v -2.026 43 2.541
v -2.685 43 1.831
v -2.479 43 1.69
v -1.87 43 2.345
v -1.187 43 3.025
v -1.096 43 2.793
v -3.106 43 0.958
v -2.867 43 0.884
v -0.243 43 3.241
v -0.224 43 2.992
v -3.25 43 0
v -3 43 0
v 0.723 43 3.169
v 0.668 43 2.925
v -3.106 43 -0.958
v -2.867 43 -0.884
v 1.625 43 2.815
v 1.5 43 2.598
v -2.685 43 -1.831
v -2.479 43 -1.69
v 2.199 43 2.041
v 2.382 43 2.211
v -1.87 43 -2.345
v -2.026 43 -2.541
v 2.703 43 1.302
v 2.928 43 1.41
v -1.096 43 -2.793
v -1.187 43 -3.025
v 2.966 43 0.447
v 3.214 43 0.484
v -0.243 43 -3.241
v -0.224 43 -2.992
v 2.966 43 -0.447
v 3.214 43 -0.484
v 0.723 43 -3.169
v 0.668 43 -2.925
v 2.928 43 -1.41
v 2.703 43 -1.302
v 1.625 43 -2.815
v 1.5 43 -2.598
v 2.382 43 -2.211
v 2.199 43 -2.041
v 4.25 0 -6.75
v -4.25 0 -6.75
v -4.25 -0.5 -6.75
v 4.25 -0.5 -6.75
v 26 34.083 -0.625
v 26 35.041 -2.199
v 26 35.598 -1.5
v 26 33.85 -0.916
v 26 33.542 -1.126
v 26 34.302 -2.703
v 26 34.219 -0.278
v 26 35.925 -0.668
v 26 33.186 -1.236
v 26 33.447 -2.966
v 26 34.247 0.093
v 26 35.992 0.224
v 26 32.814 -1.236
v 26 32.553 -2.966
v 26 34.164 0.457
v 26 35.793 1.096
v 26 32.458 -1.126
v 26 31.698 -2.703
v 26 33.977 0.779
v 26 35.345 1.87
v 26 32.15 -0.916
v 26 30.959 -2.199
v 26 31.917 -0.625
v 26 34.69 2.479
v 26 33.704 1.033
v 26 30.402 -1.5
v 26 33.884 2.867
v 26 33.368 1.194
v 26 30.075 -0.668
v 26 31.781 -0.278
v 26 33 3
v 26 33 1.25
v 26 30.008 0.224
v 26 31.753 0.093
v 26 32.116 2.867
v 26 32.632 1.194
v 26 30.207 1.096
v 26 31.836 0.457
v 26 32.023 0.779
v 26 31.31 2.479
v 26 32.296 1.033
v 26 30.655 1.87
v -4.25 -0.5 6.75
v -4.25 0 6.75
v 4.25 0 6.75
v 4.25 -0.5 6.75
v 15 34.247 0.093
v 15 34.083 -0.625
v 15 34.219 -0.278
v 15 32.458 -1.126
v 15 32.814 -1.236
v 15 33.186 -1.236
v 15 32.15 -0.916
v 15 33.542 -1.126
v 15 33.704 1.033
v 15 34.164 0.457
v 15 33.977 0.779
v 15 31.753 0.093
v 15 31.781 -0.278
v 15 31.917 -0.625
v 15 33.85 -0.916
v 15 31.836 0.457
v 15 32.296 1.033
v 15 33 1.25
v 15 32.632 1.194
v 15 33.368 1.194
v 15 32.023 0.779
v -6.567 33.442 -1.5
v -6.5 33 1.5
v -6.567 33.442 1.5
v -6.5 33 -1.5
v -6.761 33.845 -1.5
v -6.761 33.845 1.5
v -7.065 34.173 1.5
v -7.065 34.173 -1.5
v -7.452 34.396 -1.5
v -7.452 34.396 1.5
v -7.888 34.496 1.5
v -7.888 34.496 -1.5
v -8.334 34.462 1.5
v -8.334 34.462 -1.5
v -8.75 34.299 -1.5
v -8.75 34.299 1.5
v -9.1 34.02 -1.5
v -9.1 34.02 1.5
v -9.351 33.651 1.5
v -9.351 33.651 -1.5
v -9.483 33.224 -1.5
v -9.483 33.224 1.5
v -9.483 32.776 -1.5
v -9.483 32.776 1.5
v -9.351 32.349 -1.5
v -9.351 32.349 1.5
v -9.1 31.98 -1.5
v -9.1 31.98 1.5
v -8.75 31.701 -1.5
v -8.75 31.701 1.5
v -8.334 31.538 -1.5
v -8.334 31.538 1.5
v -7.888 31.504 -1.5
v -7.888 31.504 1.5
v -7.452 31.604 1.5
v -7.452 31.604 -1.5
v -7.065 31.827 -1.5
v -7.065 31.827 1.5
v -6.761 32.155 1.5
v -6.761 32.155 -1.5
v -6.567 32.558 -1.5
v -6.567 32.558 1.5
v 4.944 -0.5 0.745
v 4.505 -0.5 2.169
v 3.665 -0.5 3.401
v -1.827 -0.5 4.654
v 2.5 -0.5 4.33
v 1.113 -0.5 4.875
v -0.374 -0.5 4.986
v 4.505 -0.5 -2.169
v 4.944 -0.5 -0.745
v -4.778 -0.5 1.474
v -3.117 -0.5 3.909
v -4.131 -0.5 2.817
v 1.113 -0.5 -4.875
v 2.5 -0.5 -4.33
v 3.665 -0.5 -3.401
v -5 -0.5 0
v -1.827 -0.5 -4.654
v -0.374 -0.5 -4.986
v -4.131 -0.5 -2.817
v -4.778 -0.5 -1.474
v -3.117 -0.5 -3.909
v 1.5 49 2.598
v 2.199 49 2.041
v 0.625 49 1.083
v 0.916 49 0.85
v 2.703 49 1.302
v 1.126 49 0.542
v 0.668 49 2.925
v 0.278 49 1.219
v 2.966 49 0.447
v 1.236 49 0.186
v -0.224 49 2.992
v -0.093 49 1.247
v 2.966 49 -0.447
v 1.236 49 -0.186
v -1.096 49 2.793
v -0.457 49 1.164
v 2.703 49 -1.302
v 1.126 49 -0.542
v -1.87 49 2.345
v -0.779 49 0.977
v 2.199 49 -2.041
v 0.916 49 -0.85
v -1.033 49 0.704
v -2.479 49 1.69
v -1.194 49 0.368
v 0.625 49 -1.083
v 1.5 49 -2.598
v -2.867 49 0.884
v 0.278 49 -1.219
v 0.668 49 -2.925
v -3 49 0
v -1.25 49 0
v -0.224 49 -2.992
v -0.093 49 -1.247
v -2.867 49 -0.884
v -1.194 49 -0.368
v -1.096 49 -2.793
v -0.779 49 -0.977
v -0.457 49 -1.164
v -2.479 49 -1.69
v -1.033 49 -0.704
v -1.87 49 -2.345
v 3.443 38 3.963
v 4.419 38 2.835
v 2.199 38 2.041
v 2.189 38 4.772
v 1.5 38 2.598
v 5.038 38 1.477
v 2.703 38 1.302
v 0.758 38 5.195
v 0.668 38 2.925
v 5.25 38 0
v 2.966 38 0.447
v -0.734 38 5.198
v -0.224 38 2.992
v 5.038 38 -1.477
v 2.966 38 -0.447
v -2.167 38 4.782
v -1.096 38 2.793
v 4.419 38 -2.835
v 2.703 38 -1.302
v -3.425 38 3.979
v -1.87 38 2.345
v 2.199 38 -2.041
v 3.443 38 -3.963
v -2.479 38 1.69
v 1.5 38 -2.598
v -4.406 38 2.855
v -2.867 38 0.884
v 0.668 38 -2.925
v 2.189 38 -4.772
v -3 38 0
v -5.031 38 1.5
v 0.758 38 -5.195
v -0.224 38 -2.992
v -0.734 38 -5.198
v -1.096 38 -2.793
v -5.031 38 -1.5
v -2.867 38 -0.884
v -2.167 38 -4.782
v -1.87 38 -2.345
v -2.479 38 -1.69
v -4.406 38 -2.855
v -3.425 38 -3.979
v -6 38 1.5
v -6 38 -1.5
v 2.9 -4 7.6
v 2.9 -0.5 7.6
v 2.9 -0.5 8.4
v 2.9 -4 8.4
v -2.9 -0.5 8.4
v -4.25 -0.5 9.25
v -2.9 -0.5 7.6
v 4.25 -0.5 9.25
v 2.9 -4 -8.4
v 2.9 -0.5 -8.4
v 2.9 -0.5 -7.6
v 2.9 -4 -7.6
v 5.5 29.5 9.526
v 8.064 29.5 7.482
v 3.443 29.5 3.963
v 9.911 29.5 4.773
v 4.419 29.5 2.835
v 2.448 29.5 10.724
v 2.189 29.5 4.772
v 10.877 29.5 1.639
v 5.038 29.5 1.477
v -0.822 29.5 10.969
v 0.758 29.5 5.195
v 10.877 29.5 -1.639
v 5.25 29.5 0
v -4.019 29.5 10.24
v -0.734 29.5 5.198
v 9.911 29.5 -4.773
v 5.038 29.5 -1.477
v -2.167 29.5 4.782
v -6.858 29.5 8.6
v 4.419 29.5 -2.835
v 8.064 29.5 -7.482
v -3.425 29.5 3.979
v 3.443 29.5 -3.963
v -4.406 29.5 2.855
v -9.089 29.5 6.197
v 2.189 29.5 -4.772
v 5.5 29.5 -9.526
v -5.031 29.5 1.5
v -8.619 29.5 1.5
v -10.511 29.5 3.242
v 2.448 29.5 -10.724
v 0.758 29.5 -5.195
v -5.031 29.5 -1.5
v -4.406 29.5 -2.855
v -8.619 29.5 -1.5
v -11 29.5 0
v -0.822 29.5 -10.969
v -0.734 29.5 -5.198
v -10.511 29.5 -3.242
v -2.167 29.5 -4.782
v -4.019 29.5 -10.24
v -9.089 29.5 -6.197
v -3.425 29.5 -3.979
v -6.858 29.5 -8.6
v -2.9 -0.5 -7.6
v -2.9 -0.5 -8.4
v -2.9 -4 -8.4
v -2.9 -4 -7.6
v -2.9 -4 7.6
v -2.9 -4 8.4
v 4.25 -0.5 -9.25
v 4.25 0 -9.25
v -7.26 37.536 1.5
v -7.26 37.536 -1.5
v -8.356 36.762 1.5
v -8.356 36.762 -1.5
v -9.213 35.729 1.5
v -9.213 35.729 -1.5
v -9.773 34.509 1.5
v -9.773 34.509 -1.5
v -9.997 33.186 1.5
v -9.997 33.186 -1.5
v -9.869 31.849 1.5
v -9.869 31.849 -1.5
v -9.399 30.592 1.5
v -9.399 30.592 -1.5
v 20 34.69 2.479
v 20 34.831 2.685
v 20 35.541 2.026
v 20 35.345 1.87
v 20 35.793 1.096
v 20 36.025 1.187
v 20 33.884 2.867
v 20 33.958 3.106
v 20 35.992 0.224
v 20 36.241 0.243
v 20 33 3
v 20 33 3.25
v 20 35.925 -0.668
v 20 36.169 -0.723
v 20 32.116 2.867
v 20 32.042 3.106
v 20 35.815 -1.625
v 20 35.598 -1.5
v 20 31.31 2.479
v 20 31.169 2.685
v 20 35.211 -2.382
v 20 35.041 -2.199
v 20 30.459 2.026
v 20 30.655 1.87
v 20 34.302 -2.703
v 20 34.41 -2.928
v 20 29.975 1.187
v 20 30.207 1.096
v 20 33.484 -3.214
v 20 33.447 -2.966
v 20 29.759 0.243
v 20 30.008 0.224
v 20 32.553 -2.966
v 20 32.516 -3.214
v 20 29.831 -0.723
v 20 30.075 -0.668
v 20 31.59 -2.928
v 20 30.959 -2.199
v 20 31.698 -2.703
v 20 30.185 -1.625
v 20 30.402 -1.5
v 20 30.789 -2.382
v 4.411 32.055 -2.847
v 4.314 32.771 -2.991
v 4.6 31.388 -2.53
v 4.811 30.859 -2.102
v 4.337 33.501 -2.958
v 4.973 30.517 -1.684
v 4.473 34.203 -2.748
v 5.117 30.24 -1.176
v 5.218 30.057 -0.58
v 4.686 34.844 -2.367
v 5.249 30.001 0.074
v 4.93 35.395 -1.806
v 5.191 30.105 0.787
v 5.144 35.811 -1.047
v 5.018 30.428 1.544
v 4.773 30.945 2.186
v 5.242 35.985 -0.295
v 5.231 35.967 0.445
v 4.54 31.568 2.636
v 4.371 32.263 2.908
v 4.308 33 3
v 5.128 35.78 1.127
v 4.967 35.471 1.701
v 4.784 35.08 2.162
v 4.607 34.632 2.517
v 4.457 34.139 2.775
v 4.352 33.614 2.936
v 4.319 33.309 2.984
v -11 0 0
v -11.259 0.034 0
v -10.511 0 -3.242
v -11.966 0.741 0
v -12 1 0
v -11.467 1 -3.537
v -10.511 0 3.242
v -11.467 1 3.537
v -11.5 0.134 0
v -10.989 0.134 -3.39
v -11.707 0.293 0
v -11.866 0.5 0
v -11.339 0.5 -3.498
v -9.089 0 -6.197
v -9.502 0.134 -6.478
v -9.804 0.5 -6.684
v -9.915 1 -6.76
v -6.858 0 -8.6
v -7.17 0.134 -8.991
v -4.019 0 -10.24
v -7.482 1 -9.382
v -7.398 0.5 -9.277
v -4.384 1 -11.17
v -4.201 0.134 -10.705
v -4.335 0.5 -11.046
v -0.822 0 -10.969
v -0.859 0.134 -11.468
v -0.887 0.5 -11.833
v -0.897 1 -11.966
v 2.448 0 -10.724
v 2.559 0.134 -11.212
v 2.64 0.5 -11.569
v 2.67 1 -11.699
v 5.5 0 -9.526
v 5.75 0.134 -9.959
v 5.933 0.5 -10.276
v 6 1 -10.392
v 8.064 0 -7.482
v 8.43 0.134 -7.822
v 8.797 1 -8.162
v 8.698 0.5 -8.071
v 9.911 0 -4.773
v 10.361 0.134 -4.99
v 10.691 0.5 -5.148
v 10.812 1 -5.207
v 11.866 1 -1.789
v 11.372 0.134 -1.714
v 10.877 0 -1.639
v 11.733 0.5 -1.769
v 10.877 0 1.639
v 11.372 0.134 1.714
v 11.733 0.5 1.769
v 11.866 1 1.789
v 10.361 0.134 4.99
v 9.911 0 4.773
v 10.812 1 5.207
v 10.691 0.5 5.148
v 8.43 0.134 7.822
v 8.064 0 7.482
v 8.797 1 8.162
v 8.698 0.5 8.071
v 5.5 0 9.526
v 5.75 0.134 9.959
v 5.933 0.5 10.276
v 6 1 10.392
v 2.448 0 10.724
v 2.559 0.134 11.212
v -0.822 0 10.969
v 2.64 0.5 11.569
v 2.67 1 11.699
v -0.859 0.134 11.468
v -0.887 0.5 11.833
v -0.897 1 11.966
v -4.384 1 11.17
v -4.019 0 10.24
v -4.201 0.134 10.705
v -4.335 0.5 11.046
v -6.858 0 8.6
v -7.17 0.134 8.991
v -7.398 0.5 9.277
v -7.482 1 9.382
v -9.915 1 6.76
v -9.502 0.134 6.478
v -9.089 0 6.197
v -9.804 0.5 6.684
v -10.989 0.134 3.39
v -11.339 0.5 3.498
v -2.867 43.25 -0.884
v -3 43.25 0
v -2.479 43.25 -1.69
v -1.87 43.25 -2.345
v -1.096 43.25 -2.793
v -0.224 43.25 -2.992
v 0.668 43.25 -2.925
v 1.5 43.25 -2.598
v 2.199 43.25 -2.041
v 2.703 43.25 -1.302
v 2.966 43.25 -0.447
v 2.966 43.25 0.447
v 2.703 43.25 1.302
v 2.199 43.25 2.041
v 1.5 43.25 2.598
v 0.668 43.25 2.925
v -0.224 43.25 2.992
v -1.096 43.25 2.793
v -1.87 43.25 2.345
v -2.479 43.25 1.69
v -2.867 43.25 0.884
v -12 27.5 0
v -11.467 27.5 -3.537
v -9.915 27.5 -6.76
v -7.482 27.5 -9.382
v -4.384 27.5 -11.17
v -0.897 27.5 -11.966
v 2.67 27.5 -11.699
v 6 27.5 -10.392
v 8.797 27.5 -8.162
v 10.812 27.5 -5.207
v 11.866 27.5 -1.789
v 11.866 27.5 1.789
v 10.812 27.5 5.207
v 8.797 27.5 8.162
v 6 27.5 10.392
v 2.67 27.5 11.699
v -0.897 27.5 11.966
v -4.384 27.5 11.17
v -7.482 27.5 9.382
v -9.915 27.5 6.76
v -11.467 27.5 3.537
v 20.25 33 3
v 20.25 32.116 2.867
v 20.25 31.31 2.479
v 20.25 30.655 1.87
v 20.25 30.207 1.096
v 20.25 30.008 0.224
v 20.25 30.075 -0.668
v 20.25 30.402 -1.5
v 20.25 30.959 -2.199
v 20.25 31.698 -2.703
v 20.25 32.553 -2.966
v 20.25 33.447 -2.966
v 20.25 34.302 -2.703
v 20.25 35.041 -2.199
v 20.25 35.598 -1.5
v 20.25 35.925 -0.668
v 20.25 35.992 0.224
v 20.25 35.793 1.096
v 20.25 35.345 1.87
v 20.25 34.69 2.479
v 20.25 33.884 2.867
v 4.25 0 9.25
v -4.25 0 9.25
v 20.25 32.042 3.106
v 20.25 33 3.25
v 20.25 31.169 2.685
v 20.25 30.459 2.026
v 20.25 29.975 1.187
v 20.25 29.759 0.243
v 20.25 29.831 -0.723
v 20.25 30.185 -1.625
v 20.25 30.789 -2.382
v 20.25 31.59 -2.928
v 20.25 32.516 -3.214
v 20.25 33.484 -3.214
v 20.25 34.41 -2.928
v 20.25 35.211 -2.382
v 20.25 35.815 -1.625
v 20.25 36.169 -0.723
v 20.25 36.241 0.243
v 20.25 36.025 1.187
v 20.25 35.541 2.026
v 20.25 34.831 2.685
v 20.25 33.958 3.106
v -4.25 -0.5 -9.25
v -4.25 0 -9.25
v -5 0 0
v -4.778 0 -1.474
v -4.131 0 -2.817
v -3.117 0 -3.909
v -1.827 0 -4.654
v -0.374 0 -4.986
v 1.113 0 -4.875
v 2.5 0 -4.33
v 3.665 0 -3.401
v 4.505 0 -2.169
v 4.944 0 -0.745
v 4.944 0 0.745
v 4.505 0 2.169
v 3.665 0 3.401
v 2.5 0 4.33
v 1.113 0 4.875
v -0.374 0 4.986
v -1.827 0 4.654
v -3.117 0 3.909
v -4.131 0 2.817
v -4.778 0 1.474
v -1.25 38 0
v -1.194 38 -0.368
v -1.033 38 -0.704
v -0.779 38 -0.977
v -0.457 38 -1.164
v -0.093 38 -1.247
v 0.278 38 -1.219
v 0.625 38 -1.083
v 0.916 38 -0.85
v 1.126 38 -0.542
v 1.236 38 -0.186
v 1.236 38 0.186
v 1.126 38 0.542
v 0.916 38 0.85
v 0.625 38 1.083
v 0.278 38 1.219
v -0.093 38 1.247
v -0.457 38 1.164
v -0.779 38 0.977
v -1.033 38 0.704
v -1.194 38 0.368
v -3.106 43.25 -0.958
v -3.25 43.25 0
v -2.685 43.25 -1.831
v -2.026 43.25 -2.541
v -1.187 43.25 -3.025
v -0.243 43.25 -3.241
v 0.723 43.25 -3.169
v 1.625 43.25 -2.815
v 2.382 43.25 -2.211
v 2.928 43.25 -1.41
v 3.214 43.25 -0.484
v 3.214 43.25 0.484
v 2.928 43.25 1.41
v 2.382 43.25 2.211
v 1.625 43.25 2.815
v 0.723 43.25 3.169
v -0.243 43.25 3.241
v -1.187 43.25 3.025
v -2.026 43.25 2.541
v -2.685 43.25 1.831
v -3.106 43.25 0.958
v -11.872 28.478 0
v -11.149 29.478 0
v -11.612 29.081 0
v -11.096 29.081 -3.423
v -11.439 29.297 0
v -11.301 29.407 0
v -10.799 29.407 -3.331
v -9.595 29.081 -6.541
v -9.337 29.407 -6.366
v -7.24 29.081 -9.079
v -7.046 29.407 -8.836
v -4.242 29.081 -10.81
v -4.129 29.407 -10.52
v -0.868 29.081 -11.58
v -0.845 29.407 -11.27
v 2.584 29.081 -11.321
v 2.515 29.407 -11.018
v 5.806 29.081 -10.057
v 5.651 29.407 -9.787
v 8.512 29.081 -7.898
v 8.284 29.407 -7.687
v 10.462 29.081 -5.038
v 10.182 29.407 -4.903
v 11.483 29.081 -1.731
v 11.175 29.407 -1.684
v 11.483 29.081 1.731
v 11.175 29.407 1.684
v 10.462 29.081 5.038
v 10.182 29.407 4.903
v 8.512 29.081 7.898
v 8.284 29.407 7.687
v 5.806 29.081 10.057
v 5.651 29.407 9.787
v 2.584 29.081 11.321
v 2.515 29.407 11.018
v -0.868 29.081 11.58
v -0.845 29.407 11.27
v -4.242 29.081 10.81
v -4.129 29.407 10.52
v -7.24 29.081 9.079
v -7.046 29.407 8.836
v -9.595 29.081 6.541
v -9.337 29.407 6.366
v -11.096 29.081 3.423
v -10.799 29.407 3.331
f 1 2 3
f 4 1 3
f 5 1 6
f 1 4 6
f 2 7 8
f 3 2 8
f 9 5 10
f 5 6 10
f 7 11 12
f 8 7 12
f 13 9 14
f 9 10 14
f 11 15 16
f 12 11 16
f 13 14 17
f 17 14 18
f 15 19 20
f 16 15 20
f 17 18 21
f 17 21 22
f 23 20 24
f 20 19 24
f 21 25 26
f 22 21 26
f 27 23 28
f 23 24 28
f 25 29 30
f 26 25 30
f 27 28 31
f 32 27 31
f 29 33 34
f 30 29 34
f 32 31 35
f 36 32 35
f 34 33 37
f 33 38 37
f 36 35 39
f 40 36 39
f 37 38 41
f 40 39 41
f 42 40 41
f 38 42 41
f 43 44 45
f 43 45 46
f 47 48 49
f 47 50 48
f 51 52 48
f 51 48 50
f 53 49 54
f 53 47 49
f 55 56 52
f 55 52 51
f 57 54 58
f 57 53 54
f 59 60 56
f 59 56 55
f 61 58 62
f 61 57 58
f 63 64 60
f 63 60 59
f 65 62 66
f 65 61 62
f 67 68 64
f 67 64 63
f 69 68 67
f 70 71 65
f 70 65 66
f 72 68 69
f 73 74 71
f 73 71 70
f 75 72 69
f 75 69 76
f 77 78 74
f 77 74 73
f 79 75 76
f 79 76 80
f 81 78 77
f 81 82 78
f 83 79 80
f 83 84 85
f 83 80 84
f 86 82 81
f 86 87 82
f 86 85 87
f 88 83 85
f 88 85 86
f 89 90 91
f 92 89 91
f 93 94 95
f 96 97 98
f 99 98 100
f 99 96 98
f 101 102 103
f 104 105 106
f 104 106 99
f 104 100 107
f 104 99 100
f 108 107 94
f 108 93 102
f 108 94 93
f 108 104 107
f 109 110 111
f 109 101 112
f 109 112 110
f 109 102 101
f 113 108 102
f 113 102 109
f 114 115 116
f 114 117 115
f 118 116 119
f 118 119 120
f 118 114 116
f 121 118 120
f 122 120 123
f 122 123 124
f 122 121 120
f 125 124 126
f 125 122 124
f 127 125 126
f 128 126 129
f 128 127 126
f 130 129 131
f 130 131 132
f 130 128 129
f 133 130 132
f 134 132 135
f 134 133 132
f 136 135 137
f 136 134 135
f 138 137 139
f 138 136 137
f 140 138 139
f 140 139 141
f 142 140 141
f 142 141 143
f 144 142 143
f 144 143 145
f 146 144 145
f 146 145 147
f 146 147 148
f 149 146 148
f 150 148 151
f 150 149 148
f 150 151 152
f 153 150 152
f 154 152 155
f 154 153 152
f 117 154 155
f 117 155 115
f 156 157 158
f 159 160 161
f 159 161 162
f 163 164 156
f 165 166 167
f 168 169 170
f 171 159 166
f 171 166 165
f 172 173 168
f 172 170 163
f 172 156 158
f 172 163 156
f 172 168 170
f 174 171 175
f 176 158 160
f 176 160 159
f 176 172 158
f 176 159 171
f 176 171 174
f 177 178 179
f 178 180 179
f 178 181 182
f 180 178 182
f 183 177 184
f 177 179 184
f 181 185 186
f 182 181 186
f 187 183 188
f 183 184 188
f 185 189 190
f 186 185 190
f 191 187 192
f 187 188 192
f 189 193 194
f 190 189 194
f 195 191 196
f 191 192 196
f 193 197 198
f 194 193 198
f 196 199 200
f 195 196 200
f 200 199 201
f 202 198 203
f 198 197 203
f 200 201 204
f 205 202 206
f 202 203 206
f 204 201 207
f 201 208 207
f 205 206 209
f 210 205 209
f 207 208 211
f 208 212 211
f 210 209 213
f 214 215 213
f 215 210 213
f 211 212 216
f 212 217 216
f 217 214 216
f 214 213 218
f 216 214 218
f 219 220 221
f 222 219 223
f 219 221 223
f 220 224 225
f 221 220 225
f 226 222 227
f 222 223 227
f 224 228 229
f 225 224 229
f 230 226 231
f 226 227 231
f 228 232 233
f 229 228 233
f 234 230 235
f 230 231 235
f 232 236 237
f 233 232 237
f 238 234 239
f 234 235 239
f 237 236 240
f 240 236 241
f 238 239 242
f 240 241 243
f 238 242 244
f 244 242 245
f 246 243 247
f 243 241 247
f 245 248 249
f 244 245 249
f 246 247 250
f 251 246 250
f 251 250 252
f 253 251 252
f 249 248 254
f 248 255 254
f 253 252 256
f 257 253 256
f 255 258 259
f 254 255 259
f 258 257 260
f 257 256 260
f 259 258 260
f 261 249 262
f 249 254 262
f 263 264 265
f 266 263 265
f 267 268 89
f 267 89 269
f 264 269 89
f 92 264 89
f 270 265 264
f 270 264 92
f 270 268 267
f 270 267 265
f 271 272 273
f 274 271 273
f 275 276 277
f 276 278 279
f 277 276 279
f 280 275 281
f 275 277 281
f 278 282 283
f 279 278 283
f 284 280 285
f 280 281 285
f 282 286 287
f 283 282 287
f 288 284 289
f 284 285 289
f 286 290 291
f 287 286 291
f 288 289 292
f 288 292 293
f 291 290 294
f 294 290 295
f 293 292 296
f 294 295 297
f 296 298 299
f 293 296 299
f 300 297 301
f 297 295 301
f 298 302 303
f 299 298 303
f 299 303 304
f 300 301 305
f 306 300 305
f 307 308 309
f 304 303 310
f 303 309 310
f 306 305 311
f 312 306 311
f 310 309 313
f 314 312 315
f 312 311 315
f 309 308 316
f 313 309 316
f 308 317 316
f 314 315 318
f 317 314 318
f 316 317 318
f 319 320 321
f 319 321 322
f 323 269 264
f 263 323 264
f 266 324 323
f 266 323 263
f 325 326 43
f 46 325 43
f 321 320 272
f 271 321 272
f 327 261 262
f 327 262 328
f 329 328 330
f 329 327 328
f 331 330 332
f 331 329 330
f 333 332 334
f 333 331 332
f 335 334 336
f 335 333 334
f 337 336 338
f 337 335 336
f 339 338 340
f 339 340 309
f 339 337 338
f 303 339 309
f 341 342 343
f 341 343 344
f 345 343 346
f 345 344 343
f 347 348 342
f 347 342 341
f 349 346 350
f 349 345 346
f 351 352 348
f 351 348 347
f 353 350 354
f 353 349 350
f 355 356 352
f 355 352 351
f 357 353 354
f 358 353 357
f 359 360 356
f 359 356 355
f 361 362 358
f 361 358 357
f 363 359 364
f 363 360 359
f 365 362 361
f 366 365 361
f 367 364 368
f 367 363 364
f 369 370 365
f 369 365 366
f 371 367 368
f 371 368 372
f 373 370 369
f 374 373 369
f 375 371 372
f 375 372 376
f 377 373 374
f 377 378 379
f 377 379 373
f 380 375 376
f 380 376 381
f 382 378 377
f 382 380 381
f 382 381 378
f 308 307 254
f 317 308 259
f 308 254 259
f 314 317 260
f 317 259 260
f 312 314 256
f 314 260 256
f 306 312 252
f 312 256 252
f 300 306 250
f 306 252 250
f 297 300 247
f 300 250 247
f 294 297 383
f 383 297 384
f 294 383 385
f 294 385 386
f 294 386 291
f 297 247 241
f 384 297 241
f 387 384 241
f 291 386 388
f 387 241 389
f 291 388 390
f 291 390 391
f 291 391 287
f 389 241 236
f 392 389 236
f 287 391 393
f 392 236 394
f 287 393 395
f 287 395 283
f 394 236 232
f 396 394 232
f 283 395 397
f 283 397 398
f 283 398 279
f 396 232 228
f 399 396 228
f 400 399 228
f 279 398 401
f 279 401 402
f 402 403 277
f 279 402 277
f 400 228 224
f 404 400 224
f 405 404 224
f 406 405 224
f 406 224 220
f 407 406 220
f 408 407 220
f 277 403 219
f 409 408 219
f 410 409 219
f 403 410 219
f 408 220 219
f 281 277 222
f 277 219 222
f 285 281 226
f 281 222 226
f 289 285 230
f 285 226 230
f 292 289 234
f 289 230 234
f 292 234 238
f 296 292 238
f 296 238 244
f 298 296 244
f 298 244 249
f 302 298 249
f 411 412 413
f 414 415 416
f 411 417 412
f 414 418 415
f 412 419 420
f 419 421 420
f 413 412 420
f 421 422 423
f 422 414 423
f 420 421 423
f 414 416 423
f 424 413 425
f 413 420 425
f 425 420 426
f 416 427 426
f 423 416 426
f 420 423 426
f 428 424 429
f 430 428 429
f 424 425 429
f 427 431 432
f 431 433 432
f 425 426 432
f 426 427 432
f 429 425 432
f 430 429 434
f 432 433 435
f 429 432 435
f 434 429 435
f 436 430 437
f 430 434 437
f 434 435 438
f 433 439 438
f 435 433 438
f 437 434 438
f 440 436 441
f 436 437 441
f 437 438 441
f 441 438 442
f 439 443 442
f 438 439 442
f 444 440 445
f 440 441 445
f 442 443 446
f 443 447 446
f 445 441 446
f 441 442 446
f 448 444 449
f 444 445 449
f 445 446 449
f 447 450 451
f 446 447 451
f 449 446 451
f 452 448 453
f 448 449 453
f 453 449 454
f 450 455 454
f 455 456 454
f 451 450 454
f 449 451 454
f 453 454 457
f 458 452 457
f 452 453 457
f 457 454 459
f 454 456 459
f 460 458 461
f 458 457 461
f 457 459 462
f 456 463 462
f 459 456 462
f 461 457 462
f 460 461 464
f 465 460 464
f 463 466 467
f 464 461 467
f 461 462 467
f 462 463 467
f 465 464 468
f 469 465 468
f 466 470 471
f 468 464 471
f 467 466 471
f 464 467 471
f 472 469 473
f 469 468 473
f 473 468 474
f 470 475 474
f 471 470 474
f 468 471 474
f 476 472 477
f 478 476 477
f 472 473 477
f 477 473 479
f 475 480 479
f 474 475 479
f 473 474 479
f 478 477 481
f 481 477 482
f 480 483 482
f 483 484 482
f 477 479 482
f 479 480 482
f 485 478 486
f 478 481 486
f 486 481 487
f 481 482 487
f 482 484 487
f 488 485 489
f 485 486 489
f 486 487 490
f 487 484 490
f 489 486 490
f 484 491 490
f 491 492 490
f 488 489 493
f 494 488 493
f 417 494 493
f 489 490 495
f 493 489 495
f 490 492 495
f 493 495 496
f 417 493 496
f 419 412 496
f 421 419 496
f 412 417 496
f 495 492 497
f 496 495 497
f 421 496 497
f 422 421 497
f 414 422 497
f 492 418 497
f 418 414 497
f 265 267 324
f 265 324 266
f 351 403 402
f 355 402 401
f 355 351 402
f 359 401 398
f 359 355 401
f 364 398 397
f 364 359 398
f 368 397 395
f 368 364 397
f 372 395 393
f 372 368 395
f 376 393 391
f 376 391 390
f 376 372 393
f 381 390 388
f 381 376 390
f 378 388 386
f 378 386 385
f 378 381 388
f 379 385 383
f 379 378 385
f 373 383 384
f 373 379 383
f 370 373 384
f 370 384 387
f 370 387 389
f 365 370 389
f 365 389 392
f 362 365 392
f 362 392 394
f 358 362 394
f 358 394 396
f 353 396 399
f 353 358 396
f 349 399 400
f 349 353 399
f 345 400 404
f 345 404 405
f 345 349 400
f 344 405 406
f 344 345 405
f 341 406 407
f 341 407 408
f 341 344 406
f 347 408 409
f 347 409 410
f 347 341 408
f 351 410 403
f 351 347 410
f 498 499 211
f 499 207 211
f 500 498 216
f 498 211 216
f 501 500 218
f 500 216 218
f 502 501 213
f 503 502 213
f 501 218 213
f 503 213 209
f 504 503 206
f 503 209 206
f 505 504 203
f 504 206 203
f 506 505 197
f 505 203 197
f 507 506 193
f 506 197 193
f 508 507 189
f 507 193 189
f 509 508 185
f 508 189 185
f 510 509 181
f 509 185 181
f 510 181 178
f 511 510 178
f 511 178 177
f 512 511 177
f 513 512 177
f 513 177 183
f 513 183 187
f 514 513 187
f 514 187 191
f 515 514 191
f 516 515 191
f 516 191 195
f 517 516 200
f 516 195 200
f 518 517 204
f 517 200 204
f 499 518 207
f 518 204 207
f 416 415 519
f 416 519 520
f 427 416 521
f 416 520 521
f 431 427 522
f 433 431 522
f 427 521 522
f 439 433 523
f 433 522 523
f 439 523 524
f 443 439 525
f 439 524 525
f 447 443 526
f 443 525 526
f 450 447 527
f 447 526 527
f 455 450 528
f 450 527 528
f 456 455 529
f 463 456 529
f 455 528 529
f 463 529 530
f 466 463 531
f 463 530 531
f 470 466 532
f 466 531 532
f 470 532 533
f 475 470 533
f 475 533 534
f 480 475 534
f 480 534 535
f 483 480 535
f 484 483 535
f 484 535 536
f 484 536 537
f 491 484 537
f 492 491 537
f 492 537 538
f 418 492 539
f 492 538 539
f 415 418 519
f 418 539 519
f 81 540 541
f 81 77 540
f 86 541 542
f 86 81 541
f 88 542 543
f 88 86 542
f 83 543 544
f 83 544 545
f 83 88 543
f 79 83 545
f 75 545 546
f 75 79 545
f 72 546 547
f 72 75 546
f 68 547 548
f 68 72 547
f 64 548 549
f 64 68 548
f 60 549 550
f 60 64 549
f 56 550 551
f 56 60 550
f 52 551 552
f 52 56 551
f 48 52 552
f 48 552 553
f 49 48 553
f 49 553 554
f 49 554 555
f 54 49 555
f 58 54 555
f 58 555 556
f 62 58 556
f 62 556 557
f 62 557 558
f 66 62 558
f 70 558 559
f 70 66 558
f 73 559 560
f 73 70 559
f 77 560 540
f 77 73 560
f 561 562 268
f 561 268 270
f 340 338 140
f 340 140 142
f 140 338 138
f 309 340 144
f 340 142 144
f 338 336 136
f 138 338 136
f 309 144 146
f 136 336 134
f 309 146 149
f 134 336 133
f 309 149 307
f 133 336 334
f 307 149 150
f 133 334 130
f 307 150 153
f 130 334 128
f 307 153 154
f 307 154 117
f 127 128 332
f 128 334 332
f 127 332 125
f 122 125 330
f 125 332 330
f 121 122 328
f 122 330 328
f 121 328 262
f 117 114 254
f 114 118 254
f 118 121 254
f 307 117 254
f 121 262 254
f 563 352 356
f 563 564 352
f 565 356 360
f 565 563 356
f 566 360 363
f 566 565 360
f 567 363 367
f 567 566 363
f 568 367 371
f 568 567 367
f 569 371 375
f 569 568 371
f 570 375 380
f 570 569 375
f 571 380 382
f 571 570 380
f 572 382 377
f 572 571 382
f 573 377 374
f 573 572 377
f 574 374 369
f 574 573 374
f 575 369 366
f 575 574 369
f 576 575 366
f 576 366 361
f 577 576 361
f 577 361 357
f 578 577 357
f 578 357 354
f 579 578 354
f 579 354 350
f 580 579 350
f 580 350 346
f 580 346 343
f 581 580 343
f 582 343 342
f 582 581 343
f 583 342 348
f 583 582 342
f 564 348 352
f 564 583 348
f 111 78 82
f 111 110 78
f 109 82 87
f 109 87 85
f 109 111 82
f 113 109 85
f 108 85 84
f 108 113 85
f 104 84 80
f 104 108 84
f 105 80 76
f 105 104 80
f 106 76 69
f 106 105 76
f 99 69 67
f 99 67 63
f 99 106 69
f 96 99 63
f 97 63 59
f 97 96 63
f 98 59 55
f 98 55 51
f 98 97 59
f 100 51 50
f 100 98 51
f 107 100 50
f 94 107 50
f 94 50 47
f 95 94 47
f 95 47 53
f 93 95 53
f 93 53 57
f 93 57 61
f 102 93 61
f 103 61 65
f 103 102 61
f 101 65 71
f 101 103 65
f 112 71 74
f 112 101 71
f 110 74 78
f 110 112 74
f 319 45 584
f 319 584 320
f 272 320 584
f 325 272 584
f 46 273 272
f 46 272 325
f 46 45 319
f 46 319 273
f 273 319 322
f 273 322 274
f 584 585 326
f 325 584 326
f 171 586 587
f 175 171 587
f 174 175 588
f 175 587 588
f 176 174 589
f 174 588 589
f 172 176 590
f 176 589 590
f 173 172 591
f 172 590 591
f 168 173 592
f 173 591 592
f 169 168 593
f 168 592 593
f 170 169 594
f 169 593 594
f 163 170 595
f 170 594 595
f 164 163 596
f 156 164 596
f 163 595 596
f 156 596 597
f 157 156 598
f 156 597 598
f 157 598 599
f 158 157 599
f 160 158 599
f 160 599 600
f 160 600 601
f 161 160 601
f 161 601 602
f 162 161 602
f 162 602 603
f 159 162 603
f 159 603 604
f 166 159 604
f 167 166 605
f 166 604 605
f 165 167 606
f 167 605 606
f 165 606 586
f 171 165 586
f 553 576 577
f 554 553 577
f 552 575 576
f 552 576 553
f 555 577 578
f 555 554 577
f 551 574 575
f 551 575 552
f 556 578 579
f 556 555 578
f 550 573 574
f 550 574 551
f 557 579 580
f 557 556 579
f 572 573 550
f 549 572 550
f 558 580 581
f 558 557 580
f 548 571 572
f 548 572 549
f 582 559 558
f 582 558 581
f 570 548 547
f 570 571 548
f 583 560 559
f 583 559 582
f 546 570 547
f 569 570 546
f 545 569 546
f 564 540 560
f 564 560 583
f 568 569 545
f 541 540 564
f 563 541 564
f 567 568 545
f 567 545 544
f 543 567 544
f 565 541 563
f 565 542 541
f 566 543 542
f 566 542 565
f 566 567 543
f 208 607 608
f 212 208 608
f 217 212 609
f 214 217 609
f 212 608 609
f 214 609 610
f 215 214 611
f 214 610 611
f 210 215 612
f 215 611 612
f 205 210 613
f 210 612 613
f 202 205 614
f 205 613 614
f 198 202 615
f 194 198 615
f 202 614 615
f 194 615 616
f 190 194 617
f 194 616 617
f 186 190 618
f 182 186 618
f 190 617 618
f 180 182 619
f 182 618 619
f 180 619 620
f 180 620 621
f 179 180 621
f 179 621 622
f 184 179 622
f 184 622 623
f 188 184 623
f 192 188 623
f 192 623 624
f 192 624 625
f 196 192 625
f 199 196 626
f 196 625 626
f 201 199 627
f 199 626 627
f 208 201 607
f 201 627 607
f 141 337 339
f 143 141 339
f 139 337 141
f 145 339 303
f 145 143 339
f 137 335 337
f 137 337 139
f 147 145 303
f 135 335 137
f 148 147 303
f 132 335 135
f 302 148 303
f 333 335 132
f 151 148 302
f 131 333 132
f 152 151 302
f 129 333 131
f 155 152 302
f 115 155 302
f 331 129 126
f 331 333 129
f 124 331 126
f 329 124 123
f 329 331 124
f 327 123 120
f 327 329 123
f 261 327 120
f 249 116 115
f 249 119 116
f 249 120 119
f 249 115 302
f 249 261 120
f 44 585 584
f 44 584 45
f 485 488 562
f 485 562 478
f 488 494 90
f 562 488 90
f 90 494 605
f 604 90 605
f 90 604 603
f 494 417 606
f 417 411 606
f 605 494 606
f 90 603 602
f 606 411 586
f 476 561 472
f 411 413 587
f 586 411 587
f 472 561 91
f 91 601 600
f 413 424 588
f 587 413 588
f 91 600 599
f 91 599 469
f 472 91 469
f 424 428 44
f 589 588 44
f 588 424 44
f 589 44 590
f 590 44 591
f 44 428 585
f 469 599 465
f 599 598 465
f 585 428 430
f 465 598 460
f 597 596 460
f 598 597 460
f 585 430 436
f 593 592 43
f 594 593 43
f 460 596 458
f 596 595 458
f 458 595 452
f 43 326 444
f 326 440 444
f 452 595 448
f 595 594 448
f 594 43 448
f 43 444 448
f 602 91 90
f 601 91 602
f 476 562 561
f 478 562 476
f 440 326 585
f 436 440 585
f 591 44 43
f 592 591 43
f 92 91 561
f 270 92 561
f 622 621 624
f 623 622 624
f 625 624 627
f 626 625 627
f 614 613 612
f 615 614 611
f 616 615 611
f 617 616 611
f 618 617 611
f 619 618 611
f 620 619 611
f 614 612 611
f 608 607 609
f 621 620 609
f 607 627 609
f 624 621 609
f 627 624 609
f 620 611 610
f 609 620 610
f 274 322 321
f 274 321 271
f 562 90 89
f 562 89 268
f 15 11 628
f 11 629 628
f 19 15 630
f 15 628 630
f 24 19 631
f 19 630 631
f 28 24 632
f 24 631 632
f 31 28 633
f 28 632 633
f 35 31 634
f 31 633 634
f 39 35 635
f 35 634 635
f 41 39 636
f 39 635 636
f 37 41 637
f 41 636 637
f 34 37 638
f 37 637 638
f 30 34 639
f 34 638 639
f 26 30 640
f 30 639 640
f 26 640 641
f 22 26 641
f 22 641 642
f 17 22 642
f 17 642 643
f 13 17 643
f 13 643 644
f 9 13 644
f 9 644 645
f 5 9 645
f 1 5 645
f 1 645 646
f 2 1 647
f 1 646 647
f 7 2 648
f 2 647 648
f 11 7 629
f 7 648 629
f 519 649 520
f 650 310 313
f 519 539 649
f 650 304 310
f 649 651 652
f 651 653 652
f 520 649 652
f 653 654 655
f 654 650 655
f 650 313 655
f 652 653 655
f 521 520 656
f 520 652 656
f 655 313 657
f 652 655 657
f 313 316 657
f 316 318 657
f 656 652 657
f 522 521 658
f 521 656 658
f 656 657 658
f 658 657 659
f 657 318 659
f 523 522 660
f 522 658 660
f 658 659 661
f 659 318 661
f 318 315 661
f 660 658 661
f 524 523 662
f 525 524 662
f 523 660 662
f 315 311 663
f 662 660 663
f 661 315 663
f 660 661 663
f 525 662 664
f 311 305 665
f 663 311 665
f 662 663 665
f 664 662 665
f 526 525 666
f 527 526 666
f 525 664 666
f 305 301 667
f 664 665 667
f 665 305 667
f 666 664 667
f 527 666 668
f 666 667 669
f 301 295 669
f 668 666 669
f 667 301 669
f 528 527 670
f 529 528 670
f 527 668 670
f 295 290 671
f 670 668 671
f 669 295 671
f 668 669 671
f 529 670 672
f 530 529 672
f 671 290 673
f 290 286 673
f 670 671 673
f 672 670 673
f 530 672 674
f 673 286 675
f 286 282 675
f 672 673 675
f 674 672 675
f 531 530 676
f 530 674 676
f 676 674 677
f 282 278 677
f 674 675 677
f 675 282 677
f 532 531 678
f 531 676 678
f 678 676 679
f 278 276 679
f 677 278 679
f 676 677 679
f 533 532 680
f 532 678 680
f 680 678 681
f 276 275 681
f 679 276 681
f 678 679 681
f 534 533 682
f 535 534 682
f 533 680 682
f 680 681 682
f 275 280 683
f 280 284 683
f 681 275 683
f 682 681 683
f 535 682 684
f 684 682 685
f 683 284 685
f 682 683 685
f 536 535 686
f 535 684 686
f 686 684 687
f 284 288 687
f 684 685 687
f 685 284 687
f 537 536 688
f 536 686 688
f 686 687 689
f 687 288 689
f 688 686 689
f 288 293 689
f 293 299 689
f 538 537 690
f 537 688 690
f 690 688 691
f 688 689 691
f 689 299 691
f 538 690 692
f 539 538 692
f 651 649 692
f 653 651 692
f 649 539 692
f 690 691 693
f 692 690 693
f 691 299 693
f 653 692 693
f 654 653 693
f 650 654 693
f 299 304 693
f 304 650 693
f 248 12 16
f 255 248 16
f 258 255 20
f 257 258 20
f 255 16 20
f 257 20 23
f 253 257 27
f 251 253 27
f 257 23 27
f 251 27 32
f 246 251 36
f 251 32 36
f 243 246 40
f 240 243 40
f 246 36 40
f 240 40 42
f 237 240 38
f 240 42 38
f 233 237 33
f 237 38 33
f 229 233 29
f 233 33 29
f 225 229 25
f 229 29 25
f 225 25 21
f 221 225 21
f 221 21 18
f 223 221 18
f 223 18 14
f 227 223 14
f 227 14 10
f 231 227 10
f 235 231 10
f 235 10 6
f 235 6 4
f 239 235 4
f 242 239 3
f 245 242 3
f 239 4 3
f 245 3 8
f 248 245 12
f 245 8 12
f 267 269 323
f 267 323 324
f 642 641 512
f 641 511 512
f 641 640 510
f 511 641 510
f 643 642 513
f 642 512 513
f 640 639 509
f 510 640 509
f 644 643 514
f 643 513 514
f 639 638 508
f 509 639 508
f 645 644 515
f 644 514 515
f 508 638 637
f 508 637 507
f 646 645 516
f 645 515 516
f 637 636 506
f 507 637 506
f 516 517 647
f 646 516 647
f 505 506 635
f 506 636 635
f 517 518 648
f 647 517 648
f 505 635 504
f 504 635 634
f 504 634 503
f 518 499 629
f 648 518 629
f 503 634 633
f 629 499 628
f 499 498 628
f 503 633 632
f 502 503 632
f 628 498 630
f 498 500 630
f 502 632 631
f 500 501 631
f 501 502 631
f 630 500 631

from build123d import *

# Parameters (mm, degrees)
ESQUISSE2_R        = 1.5
BOSS_EXTRU_1_DEPTH = 1.5
ESQUISSE4_R        = 5
ESQUISSE4_W        = 8.5
ESQUISSE4_H        = 2.5
BOSS_EXTRU_2_DEPTH = 0.5
ESQUISSE5_W        = 5.8
ESQUISSE5_H        = 0.8
BOSS_EXTRU_3_DEPTH = 4
CONG_2_SIZE        = 2
CONG_2_SIZE_2      = 1
CONG_3_R           = 1


with BuildPart() as part:
    # Esquisse1 → Révolution1 (revolve)
    with BuildSketch(Plane.XY, mode=Mode.PRIVATE) as r_volution1_sk:
        Polygon((0, 0), (12, 0), (12, 29.5), (5.25, 29.5), (5.25, 38), (3, 38), (3, 43), (3.25, 43), (3.25, 43.25), (3, 43.25), (3, 49), (1.25, 49), (1.25, 38), (0, 38), align=None)
    revolve(r_volution1_sk.sketch.rotate(Axis((0, 0, 0), (0, -1, 0)), 180), axis=Axis((0, 0, 0), (0, -1, 0)))

    # Esquisse2 → Boss.-Extru.1 (add, symmetric)
    with BuildSketch(Plane.XY):
        with BuildLine():
            Line((0, 38), (-6, 38))
            ThreePointArc((-6, 38), (-10, 33), (-6, 28))
            Line((-6, 28), (0, 28))
            Line((0, 28), (0, 38))
        make_face()
        with Locations((-8, 33)):
            Circle(ESQUISSE2_R, mode=Mode.SUBTRACT)
    extrude(amount=BOSS_EXTRU_1_DEPTH, both=True)

    # Esquisse3 → Révolution3 (revolve)
    with BuildSketch(Plane.XY, mode=Mode.PRIVATE) as r_volution3_sk:
        Polygon((0, 36), (20, 36), (20, 36.25), (20.25, 36.25), (20.25, 36), (26, 36), (26, 34.25), (15, 34.25), (15, 33), (0, 33), align=None)
    revolve(r_volution3_sk.sketch.rotate(Axis((15, 33, 0), (1, 0, 0)), 90), axis=Axis((15, 33, 0), (1, 0, 0)))

    # Esquisse4 → Boss.-Extru.2 (add)
    with BuildSketch(Plane.XZ):
        with Locations(Location((0, 0, 0), (0, 0, 180))):
            Circle(ESQUISSE4_R)
        with Locations((0, 8)):
            Rectangle(ESQUISSE4_W, ESQUISSE4_H)
        with Locations((0, -8)):
            Rectangle(ESQUISSE4_W, ESQUISSE4_H)
    extrude(amount=BOSS_EXTRU_2_DEPTH)

    # Esquisse5 → Boss.-Extru.3 (add)
    with BuildSketch(Plane.XZ):
        with Locations((0, 8)):
            Rectangle(ESQUISSE5_W, ESQUISSE5_H)
        with Locations((0, -8)):
            Rectangle(ESQUISSE5_W, ESQUISSE5_H)
    extrude(amount=BOSS_EXTRU_3_DEPTH)

    # Congé2
    # an asymmetric fillet: 2, 1 mm, written as the material it takes off along each edge
    with BuildSketch(Plane(origin=(0, 29.5, 0), x_dir=(-1, 0, 0), z_dir=(0, 0, 1))) as cong_2_piece_1:
        with BuildLine():
            Bezier((12, CONG_2_SIZE), (12, 0), (12 - CONG_2_SIZE_2, 0), weights=[1, 0.707106781, 1])
            Line((12 - CONG_2_SIZE_2, 0), (12, 0))
            Line((12, 0), (12, CONG_2_SIZE))
        make_face()
    revolve(axis=Axis((0, 29.5, 0), (0, -1, 0)), mode=Mode.SUBTRACT)

    # Congé3
    cong_3_edges = [part.edges().sort_by_distance(p)[0] for p in [
        (12, 0, 0),
    ]]
    fillet(cong_3_edges, radius=CONG_3_R)


solid = part.part
